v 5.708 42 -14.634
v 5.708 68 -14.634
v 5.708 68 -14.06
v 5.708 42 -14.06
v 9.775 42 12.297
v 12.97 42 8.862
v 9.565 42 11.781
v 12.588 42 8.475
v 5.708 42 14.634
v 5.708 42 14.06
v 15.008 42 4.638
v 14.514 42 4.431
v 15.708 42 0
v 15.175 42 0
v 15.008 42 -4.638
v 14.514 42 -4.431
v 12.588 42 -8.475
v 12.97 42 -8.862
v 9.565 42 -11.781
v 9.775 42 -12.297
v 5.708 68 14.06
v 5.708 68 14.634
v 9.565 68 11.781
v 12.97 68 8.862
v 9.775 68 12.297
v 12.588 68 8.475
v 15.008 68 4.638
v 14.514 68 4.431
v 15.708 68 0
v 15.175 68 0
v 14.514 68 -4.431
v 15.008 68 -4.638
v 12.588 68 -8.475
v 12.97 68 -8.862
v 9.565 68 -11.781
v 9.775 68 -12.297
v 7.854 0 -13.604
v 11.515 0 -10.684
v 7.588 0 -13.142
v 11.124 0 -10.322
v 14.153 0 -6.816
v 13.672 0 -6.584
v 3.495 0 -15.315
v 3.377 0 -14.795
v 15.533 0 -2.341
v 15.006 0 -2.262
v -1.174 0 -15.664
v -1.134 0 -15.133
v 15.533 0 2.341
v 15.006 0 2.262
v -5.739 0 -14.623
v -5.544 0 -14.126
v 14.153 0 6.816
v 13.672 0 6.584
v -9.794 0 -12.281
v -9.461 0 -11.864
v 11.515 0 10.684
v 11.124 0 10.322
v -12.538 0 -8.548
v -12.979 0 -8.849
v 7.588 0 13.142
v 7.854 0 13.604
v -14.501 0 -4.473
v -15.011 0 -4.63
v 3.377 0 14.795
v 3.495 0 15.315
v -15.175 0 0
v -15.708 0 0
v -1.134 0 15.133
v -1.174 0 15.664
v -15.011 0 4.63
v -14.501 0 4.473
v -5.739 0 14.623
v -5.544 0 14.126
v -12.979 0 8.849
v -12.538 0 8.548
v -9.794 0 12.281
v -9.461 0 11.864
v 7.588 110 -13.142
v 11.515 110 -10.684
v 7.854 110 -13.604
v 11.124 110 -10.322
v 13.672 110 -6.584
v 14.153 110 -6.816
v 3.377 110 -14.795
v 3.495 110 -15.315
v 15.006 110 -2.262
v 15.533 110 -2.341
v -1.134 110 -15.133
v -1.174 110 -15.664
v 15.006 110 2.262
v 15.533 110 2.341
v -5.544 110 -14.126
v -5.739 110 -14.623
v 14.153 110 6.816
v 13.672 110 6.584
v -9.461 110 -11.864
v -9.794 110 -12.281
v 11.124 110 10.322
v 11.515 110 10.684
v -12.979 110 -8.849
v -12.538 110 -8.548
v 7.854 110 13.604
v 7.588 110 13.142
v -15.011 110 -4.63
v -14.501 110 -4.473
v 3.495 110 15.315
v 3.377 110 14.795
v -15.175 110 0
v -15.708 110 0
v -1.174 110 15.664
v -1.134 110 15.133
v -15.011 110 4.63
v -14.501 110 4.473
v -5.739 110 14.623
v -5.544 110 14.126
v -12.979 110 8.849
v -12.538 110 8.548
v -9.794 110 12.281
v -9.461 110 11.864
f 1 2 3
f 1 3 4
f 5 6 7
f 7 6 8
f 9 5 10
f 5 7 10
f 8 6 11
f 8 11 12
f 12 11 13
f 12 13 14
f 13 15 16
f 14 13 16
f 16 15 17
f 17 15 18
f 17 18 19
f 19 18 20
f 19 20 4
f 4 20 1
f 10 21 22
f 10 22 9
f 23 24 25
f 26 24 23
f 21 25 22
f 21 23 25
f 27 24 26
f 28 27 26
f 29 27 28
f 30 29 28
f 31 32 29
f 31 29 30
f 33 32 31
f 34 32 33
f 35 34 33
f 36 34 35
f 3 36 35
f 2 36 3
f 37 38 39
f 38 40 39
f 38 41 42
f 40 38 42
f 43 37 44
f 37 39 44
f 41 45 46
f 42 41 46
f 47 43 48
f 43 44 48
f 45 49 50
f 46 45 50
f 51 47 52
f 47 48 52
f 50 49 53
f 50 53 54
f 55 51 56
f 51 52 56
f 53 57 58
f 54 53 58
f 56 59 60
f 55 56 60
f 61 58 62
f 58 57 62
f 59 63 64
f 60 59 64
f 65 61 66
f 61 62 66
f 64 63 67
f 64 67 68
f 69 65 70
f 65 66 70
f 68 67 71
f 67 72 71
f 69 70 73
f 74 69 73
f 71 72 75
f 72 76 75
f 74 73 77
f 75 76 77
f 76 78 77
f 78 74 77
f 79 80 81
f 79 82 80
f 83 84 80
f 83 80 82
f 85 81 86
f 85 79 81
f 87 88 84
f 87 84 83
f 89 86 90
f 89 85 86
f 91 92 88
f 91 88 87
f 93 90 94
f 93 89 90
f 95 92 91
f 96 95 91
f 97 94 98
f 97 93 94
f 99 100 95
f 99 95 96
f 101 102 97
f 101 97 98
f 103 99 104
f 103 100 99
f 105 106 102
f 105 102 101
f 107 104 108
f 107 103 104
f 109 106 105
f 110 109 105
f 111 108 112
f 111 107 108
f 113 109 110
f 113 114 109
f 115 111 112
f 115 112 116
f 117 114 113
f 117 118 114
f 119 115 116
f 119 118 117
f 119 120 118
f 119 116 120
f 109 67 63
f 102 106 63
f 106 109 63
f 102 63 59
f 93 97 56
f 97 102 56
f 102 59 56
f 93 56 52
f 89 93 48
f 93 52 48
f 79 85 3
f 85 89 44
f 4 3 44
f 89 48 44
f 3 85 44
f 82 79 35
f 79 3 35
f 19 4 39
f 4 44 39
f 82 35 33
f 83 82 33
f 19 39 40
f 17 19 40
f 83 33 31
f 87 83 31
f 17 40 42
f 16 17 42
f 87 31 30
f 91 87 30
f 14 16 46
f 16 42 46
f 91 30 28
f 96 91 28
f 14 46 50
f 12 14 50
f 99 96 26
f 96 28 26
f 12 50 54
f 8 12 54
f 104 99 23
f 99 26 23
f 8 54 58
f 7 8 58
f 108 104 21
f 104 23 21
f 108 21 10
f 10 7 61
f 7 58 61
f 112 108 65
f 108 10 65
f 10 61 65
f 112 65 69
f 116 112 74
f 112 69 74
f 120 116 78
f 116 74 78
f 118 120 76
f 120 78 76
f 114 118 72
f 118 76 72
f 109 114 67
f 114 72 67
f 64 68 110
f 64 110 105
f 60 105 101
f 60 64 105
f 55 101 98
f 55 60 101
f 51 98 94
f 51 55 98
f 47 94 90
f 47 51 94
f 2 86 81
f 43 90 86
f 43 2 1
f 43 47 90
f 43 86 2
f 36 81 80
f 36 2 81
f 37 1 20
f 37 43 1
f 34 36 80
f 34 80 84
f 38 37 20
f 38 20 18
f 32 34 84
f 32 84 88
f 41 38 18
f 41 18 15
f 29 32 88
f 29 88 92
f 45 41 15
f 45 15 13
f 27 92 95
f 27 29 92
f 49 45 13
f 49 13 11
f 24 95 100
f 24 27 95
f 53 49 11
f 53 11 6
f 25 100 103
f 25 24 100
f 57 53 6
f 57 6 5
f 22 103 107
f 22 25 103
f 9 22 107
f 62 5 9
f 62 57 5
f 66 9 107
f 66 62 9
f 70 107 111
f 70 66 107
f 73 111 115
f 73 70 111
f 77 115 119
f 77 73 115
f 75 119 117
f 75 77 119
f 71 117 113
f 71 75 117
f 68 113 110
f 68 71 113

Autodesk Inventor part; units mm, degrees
ref_plane "YZ Plane" through (0, 0, 0) normal (1, 0, 0) x (0, 1, 0)
ref_plane "XZ Plane" through (0, 0, 0) normal (0, 1, 0) x (-1, 0, 0)
ref_plane "XY Plane" through (0, 0, 0) normal (0, 0, 1) x (1, 0, 0)
sketch "Sketch1" plane through (0, 0, 0) normal (0, 1, 0) x (-1, 0, 0)
  circle A0 centre (0, 0) radius 15.175
  circle A1 centre (0, 0) radius 15.7084
  dimension "d1" = 30.35
  dimension "d2" = 31.4168
extrude "Extrusion1" add sketch "Sketch1" along normal blind 110
sketch "Sketch3" plane through (0, 0, 0) normal (0, 0, 1) x (1, 0, 0)
  line L0 (15.7084, 42) -> (15.7084, 68)
  line L1 (15.7084, 68) -> (5.7084, 68)
  line L2 (5.7084, 68) -> (5.7084, 42)
  line L3 (15.7084, 42) -> (5.7084, 42)
  point P0 (0, 0)
  dimension "d7" = 26
  dimension "d8" = 10
extrude "Extrusion2" cut sketch "Sketch3" along normal mid plane 110
properties part number "DPLX_P007_Wire_Mesh_Sleeve_Spark_Gap" material "Stucco"
